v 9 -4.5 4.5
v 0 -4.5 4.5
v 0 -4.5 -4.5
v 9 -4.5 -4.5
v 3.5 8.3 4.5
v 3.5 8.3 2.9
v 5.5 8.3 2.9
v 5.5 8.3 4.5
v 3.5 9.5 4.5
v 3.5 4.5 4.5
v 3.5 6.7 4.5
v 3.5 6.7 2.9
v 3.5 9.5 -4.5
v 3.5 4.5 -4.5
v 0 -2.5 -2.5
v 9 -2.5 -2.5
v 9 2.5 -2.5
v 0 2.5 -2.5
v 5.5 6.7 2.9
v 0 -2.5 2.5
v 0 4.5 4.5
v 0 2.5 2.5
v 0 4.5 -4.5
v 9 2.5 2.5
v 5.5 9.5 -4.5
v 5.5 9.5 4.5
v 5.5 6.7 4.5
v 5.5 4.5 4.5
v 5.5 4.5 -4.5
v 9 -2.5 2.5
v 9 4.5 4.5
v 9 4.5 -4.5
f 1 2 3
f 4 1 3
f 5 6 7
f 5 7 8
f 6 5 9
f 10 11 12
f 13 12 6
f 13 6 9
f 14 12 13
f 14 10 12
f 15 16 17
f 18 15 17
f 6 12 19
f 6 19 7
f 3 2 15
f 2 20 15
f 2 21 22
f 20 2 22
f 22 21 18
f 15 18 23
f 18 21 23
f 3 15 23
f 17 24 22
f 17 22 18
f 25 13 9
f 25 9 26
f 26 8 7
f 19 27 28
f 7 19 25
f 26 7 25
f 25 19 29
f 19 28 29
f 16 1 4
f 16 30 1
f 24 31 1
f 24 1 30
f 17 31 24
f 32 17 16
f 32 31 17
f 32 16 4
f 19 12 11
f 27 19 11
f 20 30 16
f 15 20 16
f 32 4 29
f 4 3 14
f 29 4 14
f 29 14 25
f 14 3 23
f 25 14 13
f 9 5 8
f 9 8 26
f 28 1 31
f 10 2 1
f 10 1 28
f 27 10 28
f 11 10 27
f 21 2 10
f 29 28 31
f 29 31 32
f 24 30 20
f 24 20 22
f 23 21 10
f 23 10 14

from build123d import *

# Parameters (mm, degrees)
SKETCH1_W           = 9
SKETCH1_H           = 9
SKETCH1_W_2         = 5
SKETCH1_H_2         = 5
BOSS_EXTRUDE1_DEPTH = 9
SKETCH2_W           = 2
SKETCH2_H           = 9
BOSS_EXTRUDE2_DEPTH = 5
SKETCH4_W           = 1.6
SKETCH4_H           = 1.6
CUT_EXTRUDE2_DEPTH  = 5


with BuildPart() as part:
    # Sketch1 → Boss-Extrude1 (new body)
    with BuildSketch(Plane(origin=(0, 0, 0), x_dir=(0, 0, -1), z_dir=(1, 0, 0))):
        Rectangle(SKETCH1_W, SKETCH1_H)
        Rectangle(SKETCH1_W_2, SKETCH1_H_2, mode=Mode.SUBTRACT)
    extrude(amount=BOSS_EXTRUDE1_DEPTH)

    # Sketch2 → Boss-Extrude2 (add)
    with BuildSketch(Plane(origin=(0, 4.5, 0), x_dir=(1, 0, 0), z_dir=(0, 1, 0))):
        with Locations((4.5, 0)):
            Rectangle(SKETCH2_W, SKETCH2_H)
    extrude(amount=BOSS_EXTRUDE2_DEPTH)

    # Sketch4 → Cut-Extrude2 (cut)
    with BuildSketch(Plane.ZY.offset(-3.5)):
        with Locations((3.7, 7.5)):
            Rectangle(SKETCH4_W, SKETCH4_H)
    extrude(amount=-CUT_EXTRUDE2_DEPTH, mode=Mode.SUBTRACT)


solid = part.part
